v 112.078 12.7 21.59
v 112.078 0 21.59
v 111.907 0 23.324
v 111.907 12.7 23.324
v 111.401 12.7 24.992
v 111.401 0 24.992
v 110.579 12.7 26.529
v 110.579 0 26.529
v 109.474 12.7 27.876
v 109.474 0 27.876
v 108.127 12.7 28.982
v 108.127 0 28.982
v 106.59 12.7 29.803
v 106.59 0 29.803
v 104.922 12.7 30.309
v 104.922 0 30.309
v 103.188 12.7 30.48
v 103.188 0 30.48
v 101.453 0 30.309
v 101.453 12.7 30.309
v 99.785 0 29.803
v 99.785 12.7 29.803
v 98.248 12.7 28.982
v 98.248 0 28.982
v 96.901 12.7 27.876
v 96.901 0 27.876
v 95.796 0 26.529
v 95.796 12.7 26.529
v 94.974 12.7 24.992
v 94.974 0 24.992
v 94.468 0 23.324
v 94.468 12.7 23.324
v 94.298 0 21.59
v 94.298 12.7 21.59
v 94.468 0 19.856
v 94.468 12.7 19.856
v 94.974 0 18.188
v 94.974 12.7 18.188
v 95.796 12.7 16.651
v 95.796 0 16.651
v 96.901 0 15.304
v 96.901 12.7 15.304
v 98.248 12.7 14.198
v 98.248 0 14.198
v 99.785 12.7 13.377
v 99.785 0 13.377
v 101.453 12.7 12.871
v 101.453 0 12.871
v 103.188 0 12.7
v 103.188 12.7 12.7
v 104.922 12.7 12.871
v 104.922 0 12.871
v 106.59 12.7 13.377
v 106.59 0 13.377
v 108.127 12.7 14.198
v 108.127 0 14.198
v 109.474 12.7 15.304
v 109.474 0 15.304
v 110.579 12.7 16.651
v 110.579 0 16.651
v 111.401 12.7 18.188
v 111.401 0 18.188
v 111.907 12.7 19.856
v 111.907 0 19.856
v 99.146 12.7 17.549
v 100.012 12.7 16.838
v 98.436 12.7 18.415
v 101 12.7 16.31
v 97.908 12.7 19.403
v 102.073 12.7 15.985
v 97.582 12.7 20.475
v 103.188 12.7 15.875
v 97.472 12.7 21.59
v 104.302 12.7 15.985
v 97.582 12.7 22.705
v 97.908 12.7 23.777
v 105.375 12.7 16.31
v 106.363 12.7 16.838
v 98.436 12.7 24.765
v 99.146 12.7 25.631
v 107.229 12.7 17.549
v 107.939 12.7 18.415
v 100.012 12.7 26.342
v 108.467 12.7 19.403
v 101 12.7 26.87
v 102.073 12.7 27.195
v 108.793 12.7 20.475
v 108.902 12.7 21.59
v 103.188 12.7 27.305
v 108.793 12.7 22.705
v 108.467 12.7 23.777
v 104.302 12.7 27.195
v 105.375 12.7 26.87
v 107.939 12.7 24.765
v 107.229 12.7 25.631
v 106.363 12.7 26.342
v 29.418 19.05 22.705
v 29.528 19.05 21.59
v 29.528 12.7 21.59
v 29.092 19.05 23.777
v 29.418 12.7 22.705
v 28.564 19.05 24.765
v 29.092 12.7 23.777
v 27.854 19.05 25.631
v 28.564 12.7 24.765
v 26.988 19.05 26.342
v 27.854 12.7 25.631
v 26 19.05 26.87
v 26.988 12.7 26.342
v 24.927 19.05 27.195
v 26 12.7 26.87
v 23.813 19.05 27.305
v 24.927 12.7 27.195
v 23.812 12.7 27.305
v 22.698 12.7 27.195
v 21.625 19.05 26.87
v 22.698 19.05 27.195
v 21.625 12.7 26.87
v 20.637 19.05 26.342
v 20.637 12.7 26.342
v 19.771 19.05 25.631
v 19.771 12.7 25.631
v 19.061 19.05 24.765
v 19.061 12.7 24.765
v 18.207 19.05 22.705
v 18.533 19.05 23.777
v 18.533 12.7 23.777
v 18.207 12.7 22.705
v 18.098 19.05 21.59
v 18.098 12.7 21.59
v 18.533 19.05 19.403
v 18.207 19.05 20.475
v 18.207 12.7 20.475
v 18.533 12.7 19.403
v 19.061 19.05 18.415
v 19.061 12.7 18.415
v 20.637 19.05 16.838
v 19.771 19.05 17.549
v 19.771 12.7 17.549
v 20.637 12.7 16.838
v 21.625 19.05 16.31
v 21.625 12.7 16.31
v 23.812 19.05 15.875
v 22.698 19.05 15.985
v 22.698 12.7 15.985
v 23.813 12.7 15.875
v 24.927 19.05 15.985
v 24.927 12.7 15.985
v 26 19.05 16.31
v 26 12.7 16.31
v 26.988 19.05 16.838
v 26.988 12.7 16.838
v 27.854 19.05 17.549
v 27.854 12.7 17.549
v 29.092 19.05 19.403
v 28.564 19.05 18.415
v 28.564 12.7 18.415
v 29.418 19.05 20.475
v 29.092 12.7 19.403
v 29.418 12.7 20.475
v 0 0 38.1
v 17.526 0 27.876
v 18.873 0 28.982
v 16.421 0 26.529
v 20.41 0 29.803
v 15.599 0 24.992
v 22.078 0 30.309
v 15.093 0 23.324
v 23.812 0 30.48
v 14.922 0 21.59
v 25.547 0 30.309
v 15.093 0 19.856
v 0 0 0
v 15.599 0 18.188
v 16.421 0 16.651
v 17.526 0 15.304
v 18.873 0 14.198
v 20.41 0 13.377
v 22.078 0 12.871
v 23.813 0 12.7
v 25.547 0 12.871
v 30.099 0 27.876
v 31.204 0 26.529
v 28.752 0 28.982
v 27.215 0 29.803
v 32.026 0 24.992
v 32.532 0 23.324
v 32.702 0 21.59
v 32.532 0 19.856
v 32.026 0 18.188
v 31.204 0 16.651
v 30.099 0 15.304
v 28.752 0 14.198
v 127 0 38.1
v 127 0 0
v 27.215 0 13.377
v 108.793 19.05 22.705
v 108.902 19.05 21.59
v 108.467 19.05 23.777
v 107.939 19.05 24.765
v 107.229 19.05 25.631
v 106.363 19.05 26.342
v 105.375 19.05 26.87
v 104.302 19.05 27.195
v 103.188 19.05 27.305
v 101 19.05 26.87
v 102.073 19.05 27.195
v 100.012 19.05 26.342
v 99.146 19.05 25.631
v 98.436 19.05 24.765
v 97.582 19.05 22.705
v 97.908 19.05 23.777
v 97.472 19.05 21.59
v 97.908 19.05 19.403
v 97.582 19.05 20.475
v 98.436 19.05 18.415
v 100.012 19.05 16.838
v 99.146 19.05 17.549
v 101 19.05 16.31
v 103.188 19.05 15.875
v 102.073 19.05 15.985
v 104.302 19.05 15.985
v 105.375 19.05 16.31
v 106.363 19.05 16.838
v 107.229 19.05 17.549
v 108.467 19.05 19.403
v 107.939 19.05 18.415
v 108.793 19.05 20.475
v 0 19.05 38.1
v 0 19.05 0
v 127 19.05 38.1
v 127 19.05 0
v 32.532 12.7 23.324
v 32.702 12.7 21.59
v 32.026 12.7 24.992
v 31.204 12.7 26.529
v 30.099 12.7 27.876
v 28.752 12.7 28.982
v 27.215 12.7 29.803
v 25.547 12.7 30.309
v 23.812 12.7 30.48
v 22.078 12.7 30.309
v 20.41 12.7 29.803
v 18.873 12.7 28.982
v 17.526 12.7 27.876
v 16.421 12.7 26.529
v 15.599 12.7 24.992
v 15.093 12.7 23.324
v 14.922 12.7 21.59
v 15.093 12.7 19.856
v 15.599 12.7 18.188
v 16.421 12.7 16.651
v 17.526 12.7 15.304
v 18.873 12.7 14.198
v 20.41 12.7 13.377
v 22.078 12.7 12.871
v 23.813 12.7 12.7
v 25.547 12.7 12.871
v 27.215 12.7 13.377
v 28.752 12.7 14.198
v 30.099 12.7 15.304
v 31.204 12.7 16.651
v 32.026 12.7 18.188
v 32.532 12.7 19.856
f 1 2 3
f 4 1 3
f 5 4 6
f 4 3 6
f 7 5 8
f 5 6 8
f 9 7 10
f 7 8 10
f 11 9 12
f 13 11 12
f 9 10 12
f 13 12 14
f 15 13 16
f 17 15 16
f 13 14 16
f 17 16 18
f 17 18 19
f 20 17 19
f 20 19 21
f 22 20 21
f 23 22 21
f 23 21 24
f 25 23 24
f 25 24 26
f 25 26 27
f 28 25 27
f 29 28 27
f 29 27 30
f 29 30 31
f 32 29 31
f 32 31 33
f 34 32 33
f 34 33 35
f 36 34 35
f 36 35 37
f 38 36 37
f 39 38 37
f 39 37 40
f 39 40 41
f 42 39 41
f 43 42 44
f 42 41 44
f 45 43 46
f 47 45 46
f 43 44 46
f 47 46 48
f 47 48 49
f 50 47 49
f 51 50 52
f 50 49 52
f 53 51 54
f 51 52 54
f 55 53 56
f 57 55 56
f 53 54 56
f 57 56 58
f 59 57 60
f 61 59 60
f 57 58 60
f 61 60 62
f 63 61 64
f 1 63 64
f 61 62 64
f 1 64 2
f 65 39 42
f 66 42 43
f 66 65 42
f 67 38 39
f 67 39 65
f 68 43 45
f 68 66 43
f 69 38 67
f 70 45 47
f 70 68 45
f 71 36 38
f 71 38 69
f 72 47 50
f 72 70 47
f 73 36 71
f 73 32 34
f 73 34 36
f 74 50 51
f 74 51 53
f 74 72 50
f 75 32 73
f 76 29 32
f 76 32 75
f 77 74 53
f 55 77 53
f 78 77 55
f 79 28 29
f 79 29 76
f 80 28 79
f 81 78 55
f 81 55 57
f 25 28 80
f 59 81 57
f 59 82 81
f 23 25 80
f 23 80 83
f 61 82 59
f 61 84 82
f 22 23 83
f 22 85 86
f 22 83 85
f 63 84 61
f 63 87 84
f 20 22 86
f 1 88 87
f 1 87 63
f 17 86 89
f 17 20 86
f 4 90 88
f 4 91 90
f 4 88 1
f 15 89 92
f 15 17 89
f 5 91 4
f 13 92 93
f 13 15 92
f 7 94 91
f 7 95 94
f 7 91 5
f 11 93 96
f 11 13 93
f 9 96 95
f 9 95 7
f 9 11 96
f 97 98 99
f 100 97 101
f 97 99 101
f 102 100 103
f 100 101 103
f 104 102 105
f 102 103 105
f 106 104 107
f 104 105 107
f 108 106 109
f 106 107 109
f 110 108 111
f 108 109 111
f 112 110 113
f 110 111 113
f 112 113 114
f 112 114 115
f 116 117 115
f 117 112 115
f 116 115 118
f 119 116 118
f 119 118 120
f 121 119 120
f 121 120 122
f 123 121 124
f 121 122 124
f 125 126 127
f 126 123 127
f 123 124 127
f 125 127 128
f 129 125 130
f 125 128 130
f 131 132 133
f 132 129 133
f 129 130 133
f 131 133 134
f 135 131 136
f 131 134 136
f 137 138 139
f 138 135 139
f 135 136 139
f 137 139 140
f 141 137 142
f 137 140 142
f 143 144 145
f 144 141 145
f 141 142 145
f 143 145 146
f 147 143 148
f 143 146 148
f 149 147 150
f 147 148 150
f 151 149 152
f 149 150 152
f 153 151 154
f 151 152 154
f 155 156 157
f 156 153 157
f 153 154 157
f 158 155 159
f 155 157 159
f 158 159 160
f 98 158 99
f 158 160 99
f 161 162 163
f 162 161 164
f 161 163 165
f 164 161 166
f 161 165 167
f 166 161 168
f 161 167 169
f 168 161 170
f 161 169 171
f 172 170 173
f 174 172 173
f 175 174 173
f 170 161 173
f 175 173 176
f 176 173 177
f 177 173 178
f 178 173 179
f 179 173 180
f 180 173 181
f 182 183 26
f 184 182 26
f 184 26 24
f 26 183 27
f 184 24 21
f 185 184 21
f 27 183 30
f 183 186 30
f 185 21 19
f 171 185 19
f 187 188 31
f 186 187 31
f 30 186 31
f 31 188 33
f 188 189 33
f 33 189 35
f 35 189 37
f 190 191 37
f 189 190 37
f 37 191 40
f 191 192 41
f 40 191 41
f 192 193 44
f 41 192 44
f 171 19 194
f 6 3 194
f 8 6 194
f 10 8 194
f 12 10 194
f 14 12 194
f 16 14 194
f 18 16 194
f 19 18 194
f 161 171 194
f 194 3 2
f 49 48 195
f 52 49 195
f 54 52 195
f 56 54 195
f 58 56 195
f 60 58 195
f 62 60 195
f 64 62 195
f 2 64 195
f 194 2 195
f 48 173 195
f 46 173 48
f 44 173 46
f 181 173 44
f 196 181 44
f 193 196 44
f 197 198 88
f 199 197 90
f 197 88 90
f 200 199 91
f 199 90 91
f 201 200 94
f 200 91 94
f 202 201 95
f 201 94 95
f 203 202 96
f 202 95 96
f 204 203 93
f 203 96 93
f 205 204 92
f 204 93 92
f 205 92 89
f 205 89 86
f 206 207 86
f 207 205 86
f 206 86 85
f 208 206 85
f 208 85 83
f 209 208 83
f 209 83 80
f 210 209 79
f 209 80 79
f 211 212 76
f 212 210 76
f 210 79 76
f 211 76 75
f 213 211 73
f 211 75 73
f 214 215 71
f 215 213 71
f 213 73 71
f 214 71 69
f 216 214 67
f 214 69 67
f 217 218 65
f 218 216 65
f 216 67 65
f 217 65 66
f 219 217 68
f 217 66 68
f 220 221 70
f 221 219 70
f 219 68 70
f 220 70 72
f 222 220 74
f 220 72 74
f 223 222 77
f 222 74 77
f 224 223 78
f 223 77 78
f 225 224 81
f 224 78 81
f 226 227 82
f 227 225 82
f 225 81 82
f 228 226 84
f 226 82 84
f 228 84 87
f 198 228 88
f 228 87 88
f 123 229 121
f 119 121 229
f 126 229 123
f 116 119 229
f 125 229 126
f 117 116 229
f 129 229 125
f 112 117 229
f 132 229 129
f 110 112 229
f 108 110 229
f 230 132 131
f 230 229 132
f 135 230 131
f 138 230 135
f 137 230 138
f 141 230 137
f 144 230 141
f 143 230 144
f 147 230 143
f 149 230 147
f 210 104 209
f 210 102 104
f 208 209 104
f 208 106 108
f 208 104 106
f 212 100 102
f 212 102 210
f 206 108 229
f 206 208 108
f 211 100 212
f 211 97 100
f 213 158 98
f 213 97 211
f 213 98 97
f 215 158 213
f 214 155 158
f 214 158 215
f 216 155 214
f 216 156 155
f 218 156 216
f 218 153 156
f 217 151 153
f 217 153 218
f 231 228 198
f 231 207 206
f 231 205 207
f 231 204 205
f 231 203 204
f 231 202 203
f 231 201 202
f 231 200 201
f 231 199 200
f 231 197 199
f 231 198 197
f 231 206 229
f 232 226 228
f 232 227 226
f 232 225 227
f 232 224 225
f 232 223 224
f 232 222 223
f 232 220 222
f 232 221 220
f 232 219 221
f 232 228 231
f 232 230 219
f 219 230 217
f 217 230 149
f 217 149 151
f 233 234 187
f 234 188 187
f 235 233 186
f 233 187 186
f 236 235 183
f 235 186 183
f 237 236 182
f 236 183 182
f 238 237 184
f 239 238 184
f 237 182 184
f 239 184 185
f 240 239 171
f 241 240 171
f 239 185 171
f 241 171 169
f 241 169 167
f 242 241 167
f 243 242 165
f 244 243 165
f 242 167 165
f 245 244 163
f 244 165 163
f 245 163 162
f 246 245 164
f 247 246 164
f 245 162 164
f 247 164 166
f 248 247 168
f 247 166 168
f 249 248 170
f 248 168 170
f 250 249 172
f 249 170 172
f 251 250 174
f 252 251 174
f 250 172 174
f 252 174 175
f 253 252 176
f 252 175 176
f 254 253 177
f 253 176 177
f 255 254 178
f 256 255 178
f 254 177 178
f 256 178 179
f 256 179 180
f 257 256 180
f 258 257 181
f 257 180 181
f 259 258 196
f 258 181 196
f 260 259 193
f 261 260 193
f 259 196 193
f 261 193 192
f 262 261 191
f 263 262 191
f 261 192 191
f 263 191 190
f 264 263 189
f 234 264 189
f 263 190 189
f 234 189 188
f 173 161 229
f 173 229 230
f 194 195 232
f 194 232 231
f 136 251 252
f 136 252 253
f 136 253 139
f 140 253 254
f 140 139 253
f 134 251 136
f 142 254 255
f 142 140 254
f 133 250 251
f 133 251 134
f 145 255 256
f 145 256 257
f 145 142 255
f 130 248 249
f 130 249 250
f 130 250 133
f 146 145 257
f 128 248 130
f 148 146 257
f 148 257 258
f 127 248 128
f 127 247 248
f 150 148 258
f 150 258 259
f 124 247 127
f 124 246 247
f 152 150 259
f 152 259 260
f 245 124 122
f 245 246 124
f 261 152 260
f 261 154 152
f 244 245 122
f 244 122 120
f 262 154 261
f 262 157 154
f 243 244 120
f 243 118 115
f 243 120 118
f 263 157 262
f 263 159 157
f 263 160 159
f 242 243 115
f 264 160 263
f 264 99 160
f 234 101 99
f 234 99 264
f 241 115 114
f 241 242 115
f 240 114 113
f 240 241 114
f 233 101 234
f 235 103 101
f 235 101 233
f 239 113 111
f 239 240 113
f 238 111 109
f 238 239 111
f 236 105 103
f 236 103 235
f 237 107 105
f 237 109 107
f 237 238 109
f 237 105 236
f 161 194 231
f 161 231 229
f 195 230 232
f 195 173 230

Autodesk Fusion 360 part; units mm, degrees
sketch "Sketch1" plane through (0, 0, 0) normal (0, 1, 0) x (1, 0, 0) in component "softJaws"
  line L0 (0, 0) -> (127, 0)
  line L1 (127, 0) -> (127, -38.1)
  line L2 (127, -38.1) -> (0, -38.1)
  line L3 (0, -38.1) -> (0, 0)
  circle A0 centre (23.8125, -21.59) radius 5.715
  line L4 (23.8125, -21.59) -> (103.1875, -21.59) construction
  circle A1 centre (103.1875, -21.59) radius 5.715
  line L5 (63.5, -38.1) -> (63.5, 0) construction
  point P0 (63.5, -21.59)
  dimension "d1" = 127
  dimension "d2" = 38.1
  dimension "d3" = 11.43
  dimension "d4" = 21.59
  dimension "d6" = 79.375
  dimension "d7" = 11.43
extrude "Extrude1" add sketch "Sketch1" along normal blind 19.05 in component "softJaws"
sketch "Sketch2" plane through (0, 0, 0) normal (0, -1, 0) x (1, 0, 0) in component "softJaws"
  circle A0 centre (103.1875, 21.59) radius 5.715
  circle A1 centre (23.8125, 21.59) radius 5.715
  line L0 (127, 38.1) -> (0, 38.1)
  line L1 (0, 38.1) -> (0, 0)
  line L2 (0, 0) -> (127, 0)
  line L3 (127, 0) -> (127, 38.1)
  circle A2 centre (23.8125, 21.59) radius 8.89
  circle A3 centre (103.1875, 21.59) radius 8.89
  dimension "d10" = 17.78
  dimension "d11" = 17.78
extrude "Extrude2" cut sketch "Sketch2" against normal blind 12.7 contours A2 | A3 in component "softJaws"
component "softJaws" placed x (1, 0, 0) y (0, 1, 0) z (0, 0, 1) at (0, 0, 0)
equation "d4 = d2 / 2 + 0.1 in"
